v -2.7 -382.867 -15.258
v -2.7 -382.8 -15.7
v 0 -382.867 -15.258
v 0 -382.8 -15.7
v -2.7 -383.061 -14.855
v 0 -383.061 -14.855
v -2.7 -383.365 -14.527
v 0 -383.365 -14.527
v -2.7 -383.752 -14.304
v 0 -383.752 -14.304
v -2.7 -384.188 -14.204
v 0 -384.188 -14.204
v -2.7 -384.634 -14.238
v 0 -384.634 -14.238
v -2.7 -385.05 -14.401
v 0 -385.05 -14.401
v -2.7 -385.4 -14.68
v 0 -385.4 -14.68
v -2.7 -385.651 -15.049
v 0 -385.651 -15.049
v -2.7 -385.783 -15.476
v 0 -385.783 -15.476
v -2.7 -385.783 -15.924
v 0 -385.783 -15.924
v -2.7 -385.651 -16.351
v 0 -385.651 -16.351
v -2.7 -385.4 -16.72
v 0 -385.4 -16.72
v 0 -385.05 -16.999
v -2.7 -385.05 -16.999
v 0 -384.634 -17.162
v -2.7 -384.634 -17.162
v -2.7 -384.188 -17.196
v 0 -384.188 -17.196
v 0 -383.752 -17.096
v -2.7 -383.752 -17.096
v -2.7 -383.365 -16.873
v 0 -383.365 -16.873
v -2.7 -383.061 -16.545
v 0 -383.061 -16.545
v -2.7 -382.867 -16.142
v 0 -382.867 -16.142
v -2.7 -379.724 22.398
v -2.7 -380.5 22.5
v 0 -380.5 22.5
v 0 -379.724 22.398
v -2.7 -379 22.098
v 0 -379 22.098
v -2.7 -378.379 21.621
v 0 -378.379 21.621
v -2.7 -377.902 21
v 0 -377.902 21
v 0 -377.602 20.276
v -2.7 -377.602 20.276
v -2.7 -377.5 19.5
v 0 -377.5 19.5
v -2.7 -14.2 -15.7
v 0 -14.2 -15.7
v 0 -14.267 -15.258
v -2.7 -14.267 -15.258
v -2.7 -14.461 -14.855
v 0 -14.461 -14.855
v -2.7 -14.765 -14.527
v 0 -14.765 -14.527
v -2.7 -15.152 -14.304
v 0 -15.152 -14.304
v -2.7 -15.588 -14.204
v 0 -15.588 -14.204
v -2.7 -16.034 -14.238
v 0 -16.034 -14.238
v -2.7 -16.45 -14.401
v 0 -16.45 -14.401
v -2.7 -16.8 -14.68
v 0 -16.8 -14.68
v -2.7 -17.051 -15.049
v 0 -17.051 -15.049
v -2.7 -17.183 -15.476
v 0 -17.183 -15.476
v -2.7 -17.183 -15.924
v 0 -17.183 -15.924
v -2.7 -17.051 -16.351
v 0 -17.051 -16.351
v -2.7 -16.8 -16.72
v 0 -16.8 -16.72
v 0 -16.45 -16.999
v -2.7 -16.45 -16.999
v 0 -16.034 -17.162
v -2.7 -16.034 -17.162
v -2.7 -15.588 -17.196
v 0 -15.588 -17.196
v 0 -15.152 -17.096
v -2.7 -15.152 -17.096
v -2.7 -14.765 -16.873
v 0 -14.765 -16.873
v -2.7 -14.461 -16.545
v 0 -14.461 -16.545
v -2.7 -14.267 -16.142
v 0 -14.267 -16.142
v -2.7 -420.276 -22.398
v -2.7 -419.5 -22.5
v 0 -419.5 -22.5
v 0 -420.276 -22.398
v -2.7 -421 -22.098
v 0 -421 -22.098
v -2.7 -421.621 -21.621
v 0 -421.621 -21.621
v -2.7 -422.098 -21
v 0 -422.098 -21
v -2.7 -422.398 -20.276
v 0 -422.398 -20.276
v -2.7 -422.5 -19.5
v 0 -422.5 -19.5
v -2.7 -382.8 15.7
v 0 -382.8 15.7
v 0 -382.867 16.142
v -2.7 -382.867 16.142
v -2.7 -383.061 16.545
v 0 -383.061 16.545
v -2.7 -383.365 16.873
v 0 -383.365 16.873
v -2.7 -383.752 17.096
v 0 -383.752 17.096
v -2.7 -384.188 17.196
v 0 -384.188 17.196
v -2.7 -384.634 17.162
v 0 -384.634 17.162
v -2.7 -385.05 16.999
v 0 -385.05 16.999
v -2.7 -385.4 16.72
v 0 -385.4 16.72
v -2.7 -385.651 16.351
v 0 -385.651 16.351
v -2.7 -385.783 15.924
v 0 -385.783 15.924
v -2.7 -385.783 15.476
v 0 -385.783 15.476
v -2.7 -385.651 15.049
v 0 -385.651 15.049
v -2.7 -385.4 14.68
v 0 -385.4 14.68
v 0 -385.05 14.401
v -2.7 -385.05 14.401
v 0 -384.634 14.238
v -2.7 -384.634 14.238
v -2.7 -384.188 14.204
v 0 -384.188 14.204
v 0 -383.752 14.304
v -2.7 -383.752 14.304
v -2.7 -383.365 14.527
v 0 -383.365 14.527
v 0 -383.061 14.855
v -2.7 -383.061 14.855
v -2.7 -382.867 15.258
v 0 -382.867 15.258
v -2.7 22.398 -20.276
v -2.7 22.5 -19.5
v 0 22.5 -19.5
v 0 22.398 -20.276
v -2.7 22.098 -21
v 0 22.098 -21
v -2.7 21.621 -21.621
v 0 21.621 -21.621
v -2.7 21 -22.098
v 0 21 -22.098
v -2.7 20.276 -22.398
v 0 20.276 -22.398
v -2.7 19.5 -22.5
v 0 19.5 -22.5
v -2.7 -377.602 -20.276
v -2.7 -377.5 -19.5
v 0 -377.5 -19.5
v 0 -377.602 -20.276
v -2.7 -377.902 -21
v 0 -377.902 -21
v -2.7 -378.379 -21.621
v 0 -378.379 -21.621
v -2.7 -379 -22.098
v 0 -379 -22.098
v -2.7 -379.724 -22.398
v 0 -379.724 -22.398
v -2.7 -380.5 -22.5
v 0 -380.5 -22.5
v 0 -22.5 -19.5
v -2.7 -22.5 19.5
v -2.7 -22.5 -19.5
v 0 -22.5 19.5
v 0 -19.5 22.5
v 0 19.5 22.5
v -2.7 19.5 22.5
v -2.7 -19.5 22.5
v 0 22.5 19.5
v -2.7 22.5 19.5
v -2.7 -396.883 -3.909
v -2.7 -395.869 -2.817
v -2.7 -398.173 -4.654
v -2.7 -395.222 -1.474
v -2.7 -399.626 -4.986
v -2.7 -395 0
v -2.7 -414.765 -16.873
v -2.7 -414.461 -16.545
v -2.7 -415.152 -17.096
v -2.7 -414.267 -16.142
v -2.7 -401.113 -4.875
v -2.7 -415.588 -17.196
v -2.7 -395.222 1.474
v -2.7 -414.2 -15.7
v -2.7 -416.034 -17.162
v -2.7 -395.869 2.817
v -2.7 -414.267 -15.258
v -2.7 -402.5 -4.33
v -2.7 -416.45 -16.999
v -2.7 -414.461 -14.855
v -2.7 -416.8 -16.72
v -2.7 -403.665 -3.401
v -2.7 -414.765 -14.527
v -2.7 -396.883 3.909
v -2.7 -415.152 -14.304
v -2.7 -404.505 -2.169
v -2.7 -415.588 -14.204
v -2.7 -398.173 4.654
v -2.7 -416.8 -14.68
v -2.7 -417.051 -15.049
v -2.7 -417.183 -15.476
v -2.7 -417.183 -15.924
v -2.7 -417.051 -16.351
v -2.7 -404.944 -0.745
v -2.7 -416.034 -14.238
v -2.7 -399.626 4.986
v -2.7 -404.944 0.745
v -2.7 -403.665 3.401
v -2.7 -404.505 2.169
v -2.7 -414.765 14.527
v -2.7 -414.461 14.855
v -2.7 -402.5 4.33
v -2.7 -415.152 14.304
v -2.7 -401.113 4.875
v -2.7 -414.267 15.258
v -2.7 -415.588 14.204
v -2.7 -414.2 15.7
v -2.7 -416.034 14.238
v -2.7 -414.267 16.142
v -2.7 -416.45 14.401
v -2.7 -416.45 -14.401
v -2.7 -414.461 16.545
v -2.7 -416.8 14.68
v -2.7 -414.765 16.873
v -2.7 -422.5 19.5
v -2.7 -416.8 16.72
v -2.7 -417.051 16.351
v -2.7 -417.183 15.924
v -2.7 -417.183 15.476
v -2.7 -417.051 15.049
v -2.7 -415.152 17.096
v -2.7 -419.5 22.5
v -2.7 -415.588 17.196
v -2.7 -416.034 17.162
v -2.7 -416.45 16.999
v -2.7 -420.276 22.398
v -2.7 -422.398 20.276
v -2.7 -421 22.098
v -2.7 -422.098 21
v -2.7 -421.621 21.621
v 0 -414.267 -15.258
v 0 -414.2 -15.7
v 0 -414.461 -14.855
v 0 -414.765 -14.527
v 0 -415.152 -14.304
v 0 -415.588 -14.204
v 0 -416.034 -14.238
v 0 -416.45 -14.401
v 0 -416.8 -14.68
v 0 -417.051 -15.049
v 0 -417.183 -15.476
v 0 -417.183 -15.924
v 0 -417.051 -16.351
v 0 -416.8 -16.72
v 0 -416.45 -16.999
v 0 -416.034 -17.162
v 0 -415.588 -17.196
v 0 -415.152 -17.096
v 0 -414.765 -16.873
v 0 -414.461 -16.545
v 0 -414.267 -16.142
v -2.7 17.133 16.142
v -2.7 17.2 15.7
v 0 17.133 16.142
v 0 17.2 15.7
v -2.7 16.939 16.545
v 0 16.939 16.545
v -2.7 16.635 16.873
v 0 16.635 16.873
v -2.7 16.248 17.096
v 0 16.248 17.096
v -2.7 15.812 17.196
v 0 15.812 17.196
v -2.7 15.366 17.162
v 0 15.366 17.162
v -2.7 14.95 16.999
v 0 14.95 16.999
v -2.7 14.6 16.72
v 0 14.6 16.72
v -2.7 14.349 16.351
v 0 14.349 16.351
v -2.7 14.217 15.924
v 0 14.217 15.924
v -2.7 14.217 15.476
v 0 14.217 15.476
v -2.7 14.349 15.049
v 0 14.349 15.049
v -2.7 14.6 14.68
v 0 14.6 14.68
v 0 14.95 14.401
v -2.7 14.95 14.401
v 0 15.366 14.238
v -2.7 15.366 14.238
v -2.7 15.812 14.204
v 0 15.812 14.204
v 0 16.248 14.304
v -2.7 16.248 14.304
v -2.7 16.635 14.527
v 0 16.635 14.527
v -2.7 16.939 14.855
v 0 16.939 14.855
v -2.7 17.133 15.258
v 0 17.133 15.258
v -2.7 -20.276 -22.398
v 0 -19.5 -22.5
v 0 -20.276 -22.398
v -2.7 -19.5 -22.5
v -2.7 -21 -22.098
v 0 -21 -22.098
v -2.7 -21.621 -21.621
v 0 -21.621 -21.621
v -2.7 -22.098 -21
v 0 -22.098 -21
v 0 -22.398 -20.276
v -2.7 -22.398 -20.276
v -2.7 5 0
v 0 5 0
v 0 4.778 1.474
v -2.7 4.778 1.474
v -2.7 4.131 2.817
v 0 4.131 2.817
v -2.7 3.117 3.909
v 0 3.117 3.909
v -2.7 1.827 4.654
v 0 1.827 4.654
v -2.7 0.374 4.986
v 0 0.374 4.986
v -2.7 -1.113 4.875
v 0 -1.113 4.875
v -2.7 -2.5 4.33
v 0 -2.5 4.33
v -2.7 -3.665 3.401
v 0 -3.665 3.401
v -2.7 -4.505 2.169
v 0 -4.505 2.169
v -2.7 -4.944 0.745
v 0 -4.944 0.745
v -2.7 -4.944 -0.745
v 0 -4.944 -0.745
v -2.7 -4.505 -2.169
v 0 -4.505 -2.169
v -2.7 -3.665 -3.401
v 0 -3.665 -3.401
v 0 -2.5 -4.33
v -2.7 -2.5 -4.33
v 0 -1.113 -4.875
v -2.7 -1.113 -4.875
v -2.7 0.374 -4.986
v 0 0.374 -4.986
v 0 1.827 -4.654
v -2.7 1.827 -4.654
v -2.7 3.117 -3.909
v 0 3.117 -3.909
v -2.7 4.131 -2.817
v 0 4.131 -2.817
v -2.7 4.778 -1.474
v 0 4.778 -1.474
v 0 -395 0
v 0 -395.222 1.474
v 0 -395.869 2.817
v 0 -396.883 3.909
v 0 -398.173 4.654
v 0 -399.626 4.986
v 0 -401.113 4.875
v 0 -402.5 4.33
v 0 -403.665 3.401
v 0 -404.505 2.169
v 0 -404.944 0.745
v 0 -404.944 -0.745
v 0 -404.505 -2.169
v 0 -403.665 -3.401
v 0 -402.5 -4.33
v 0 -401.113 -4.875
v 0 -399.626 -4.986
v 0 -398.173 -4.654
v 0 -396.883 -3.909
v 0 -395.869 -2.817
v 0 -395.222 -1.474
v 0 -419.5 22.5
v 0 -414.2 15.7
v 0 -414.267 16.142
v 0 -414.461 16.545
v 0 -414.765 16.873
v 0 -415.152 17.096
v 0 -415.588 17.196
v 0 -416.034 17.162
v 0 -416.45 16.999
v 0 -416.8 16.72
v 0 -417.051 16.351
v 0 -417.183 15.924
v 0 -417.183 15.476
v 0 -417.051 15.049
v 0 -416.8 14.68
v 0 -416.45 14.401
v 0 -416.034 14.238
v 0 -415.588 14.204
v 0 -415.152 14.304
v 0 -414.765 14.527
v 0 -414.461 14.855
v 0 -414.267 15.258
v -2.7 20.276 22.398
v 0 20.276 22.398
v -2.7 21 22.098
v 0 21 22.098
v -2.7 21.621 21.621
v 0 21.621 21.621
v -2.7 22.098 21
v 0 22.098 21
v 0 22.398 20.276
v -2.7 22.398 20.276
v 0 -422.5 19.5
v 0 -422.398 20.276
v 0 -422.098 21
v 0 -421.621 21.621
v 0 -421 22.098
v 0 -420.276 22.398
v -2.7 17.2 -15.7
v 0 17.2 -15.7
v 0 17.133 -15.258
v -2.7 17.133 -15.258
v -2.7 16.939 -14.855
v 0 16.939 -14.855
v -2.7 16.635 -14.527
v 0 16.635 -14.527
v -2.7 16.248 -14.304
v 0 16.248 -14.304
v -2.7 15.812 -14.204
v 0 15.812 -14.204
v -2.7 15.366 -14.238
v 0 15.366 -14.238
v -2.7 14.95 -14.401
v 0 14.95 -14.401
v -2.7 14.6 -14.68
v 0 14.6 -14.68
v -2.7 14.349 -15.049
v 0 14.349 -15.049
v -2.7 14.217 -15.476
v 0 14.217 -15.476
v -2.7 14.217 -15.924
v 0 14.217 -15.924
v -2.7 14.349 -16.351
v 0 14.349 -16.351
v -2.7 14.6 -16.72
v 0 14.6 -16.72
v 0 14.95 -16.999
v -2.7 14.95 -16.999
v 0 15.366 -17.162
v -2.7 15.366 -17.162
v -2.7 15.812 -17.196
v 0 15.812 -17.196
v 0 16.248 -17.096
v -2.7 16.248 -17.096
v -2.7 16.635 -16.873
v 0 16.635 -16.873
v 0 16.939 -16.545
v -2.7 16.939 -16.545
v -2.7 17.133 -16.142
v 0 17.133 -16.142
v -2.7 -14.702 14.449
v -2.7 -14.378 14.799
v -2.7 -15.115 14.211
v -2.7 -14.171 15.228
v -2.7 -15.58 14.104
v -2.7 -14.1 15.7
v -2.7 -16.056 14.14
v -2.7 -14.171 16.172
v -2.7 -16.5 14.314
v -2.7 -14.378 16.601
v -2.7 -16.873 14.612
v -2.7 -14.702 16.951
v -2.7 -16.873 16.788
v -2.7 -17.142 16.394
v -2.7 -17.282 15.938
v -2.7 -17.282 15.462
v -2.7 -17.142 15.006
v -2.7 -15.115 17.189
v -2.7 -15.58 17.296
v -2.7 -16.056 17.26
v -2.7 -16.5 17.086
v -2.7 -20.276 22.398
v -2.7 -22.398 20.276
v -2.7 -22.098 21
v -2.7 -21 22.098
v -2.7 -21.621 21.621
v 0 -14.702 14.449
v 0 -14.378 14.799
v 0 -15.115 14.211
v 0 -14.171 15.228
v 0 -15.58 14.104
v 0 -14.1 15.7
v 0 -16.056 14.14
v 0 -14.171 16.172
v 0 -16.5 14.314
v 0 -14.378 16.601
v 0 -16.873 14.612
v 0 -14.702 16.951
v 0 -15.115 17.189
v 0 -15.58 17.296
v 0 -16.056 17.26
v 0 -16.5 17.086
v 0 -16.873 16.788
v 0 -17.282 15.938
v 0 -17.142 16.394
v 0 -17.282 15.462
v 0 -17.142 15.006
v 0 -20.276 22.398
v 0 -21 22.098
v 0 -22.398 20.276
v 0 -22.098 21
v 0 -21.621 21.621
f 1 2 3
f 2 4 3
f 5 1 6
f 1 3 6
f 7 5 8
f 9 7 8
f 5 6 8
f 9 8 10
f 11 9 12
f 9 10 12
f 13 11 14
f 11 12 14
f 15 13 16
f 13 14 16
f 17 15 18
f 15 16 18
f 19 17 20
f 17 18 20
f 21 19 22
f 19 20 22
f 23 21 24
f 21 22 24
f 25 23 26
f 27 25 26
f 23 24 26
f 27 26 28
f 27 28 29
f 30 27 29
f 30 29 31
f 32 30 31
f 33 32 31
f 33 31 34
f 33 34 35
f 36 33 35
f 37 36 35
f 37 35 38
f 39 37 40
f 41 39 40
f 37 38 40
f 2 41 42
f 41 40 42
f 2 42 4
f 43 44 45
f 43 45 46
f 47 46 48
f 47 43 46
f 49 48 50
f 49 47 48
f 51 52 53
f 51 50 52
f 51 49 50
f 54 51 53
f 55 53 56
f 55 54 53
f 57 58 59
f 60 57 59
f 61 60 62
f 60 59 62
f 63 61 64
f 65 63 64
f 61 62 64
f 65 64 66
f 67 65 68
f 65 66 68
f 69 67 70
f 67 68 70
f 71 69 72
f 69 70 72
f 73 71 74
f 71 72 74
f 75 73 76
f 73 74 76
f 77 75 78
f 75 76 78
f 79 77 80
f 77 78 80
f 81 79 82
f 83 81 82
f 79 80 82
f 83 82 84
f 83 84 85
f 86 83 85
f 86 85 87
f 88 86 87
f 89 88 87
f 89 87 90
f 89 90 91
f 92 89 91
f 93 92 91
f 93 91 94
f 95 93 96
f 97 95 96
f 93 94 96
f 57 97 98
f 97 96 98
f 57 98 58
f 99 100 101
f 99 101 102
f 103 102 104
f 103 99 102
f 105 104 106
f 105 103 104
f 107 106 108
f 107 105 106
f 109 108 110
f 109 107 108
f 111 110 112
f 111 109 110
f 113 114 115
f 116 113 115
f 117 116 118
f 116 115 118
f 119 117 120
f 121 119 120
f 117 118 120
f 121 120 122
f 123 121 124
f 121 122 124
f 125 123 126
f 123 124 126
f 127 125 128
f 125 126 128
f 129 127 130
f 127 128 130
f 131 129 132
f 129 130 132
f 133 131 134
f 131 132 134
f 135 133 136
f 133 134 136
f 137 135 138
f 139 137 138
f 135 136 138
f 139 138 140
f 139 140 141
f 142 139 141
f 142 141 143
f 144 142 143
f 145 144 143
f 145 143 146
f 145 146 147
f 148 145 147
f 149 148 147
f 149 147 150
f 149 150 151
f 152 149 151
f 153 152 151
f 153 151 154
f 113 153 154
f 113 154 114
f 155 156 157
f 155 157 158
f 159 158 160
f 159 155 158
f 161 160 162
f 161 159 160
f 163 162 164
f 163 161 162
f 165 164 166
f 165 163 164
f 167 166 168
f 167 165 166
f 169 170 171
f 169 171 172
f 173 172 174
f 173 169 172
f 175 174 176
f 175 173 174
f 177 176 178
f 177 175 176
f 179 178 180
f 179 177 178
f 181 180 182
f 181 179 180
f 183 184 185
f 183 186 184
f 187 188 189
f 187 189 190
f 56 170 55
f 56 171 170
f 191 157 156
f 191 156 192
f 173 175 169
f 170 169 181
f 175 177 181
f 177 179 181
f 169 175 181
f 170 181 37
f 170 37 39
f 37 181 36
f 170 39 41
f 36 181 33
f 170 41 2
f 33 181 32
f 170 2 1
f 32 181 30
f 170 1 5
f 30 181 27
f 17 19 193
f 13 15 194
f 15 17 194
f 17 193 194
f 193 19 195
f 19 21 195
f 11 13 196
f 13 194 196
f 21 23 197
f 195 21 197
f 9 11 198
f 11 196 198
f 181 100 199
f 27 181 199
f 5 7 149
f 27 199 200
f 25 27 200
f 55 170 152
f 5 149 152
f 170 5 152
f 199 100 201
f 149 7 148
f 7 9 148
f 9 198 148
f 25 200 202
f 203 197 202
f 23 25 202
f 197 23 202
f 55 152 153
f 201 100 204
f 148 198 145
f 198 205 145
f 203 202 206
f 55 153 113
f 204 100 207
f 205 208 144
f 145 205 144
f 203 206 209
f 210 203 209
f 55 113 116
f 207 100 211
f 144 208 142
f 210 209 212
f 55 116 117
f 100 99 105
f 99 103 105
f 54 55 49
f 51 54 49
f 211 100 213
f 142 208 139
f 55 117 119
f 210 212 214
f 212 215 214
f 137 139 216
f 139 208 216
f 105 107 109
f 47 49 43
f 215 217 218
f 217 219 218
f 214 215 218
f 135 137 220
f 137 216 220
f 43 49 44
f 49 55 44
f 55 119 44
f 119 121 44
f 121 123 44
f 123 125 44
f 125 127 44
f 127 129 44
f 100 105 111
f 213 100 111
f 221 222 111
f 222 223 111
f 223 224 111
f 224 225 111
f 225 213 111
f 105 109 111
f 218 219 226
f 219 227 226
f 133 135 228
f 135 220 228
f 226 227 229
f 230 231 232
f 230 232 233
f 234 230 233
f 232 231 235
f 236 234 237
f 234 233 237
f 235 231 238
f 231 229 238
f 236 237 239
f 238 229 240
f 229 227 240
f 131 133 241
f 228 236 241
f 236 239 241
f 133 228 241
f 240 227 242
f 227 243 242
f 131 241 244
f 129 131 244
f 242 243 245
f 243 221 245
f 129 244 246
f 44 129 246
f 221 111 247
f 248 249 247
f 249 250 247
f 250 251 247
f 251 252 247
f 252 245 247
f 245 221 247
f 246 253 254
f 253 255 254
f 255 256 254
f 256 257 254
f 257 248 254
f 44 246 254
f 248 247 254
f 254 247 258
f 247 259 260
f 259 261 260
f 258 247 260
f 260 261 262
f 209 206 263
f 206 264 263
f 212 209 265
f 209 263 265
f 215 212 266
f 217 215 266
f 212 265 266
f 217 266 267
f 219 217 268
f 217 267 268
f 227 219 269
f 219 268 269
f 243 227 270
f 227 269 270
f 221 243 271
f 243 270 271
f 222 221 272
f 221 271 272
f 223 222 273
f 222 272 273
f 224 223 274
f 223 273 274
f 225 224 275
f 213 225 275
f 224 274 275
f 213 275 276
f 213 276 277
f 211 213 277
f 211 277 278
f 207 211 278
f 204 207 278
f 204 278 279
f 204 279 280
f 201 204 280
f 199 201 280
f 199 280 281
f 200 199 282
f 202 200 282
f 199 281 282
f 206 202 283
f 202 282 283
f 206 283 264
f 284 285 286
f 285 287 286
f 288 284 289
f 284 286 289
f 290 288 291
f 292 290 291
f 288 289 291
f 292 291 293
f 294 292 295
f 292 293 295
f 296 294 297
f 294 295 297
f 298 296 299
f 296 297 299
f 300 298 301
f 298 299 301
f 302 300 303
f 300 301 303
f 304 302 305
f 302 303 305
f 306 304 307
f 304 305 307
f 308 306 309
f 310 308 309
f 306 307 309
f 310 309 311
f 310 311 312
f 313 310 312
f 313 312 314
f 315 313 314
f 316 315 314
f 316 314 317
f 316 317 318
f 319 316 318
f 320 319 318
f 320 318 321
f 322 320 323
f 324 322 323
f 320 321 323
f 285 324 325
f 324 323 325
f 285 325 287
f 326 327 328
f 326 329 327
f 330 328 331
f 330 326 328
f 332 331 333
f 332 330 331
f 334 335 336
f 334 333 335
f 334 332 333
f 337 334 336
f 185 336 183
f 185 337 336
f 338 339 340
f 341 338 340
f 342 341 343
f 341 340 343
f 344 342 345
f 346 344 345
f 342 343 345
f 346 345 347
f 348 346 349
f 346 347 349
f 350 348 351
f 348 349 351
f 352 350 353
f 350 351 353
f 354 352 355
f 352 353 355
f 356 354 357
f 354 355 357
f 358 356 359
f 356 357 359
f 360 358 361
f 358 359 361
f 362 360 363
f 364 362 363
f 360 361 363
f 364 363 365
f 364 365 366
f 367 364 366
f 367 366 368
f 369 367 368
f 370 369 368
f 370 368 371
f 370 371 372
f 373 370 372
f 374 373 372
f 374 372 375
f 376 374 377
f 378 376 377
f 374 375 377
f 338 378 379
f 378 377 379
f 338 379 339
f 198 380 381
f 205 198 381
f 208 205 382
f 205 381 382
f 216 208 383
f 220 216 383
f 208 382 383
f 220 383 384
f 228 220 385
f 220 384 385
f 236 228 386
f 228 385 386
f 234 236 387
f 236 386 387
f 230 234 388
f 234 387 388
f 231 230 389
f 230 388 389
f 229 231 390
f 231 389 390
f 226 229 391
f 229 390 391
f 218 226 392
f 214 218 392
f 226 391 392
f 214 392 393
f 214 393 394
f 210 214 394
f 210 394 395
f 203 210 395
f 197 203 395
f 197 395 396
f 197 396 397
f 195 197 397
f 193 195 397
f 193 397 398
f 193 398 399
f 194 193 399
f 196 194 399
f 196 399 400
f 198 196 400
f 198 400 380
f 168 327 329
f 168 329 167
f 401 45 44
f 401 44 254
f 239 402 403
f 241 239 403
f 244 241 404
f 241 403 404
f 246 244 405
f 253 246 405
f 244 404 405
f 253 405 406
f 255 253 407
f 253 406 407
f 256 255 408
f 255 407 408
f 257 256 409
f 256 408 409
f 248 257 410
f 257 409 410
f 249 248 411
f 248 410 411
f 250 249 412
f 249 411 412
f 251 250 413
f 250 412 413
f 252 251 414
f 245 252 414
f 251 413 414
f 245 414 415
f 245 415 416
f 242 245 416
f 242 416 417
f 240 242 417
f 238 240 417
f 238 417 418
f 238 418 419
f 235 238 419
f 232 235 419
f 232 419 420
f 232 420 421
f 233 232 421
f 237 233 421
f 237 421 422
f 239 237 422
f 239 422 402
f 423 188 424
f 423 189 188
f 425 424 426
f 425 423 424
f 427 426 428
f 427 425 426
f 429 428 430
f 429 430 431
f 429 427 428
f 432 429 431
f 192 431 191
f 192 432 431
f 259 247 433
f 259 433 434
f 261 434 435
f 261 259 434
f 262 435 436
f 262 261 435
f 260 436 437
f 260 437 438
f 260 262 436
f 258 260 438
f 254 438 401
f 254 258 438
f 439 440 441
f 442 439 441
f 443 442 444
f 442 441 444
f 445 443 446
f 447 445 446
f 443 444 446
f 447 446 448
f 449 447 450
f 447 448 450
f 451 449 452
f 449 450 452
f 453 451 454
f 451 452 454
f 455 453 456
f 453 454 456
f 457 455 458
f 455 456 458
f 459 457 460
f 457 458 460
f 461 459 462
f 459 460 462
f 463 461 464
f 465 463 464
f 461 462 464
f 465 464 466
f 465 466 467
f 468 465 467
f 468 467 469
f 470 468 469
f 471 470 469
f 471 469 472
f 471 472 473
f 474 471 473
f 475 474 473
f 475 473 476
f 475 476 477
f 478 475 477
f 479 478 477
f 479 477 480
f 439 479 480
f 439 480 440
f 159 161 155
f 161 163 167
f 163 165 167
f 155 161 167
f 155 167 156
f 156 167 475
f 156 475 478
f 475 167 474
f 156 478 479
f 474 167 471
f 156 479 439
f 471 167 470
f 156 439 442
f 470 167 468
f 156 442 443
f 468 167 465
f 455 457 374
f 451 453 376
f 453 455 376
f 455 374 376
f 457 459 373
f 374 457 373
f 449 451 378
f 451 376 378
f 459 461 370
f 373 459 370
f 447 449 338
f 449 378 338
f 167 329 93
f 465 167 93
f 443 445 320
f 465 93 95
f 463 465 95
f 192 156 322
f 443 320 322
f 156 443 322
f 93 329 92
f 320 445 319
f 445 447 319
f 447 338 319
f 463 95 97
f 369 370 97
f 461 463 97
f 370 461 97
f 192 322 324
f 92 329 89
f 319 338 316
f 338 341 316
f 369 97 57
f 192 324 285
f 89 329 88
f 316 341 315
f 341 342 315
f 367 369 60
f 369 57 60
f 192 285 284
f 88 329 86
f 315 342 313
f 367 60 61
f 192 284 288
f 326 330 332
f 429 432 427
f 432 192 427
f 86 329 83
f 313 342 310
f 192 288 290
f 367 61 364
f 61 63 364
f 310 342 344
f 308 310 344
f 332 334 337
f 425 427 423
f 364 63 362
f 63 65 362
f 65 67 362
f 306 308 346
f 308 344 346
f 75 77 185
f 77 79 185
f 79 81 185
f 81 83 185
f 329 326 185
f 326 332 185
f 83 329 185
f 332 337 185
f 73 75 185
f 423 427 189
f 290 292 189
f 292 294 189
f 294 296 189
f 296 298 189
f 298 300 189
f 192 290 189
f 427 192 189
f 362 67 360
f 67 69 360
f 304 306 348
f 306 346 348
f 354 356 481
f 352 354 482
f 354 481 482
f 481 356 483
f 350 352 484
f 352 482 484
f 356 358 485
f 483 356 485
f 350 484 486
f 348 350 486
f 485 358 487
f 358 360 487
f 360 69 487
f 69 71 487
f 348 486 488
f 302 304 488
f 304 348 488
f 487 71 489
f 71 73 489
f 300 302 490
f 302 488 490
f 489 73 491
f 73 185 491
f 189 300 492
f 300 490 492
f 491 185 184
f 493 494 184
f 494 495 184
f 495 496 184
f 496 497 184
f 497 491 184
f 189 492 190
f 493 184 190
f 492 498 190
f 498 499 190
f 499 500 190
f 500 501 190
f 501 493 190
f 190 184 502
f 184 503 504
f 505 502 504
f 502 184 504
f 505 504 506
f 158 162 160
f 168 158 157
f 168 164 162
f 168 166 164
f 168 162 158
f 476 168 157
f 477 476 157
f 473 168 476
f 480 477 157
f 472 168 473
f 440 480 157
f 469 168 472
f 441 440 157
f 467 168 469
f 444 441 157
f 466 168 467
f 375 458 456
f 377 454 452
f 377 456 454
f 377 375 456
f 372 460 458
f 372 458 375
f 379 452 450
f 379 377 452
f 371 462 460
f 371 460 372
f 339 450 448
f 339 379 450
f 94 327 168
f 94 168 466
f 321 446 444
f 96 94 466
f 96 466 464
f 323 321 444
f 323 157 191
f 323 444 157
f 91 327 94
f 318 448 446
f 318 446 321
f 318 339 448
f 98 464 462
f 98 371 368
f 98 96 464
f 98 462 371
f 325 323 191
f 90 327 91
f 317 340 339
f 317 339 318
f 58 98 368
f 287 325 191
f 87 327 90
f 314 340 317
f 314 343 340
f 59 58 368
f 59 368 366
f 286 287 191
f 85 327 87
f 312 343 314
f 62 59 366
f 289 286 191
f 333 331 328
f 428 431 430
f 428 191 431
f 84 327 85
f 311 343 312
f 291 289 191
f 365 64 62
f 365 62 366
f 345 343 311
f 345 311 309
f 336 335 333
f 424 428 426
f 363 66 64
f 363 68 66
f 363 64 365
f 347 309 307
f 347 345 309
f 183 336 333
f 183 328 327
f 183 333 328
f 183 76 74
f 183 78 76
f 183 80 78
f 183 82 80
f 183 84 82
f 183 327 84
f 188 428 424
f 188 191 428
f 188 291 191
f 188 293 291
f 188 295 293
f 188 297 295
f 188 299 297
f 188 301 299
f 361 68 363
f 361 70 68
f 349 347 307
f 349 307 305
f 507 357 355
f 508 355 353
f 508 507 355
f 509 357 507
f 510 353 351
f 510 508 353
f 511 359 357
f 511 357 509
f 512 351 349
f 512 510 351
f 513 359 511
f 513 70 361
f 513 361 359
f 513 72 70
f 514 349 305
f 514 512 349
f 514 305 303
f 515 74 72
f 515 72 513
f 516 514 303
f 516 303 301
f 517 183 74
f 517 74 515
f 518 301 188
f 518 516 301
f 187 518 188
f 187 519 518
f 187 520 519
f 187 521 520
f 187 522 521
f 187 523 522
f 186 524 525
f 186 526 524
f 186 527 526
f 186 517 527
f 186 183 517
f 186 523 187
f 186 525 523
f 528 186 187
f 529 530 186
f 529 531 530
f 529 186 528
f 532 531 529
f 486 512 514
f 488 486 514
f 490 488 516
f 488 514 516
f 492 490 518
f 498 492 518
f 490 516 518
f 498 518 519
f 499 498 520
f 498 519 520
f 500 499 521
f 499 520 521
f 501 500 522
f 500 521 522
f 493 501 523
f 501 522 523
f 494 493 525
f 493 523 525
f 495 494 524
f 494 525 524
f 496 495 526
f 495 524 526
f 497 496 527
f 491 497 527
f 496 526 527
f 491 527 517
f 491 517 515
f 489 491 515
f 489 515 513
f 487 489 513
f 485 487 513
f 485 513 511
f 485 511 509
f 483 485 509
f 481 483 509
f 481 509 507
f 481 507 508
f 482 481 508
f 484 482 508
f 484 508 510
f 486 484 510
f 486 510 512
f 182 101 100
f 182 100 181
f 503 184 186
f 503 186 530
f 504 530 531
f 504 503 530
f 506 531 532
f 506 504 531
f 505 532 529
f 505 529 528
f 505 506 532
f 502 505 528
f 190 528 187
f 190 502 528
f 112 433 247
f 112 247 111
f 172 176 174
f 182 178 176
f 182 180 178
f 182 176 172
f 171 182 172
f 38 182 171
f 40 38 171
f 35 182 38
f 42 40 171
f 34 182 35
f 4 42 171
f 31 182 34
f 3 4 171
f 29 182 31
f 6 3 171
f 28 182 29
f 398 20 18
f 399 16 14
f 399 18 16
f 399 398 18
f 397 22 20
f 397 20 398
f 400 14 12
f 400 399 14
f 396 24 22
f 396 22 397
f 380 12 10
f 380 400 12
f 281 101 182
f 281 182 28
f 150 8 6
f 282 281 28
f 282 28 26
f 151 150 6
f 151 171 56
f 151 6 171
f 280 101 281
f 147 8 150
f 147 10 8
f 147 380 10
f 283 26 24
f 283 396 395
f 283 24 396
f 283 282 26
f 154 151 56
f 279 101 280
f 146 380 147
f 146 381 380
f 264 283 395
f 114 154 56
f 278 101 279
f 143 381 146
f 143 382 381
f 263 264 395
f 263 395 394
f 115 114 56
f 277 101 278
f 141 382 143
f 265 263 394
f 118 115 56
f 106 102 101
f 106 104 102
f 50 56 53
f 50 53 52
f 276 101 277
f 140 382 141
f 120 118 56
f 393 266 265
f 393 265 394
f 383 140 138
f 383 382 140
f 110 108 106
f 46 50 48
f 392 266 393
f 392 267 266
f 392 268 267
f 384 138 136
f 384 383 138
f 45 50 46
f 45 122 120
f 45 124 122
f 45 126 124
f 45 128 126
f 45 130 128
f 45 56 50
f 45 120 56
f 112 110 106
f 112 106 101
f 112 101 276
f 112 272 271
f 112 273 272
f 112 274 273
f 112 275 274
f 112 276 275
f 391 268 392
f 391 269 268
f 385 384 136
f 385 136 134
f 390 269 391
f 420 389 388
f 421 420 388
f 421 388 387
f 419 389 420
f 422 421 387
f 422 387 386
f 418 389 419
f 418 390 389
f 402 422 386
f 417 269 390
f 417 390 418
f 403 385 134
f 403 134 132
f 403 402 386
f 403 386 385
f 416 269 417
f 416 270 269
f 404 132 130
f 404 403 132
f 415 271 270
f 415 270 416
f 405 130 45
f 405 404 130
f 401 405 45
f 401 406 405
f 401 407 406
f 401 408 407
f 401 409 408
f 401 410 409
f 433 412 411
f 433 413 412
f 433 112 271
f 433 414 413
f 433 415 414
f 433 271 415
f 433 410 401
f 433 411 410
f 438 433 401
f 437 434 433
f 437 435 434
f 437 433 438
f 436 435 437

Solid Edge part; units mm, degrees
sketch "Sketch1" plane through (0, 0, 0) normal (1, 0, 0) x (0, 1, 0)
  line L0 (-27.5, 15) -> (-372.5, 15)
  line L1 (-372.5, 15) -> (-372.5, 27.5)
  line L2 (-427.5, 27.5) -> (-372.5, 27.5)
  line L3 (-427.5, -27.5) -> (-427.5, 27.5)
  line L4 (-372.5, -27.5) -> (-427.5, -27.5)
  line L5 (-372.5, -15) -> (-372.5, -27.5)
  line L6 (-372.5, -15) -> (-27.5, -15)
  line L7 (-27.5, -15) -> (-27.5, -27.5)
  line L8 (-27.5, -27.5) -> (27.5, -27.5)
  line L9 (27.5, -27.5) -> (27.5, 27.5)
  line L10 (27.5, 27.5) -> (-27.5, 27.5)
  line L11 (-27.5, 15) -> (-27.5, 27.5)
  circle A0 centre (-415.7, 15.7) radius 1.5
  circle A1 centre (-384.3, 15.7) radius 1.5
  circle A2 centre (-400, 0) radius 5
  circle A3 centre (-384.3, -15.7) radius 1.5
  circle A4 centre (-415.7, -15.7) radius 1.5
  circle A5 centre (15.7, -15.7) radius 1.5
  circle A6 centre (0, 0) radius 5
  circle A7 centre (-15.7, -15.7) radius 1.5
  circle A8 centre (15.7, 15.7) radius 1.5
  circle A9 centre (-15.7, 15.7) radius 1.6
  dimension "D1" = 31.4
  dimension "D2" = 31.4
  dimension "D3" = 3
  dimension "D4" = 3
  dimension "D5" = 3
  dimension "D6" = 345
  dimension "D7" = 55
  dimension "D8" = 55
  dimension "D9" = 12.5
  dimension "D10" = 12.5
  dimension "D11" = 10
  dimension "D12" = 10
  dimension "D13" = 3.2
extrude "Protrusion1" add sketch "Sketch1" against normal blind 2.7
fillet "Round_External_Edges_Feature" radius 10 11 edges at (-1.35, -27.5, 27.5) (-1.35, -27.5, 15) (-1.35, 27.5, 27.5) (-1.35, 27.5, -27.5) (-1.35, -27.5, -27.5) (-1.35, -427.5, -27.5) (-1.35, -372.5, -27.5) (-1.35, -372.5, -15) (-1.35, -372.5, 15) (-1.35, -372.5, 27.5) (-1.35, -427.5, 27.5)
sketch "Sketch2" plane through (-2.7, -200, 0) normal (-1, 0, 0) x (0, -1, 0)
  circle A0 centre (-45.5, 6.95) radius 1.5
  circle A1 centre (-45.5, -6.95) radius 1.5
  circle A2 centre (45.5, -6.95) radius 1.5
  circle A3 centre (45.5, 6.95) radius 1.5
  dimension "D1" = 18.9
  dimension "D2" = 80
  dimension "D3" = 3
  dimension "D4" = 5.5
  dimension "D5" = 2.5
extrude "Cutout1" cut sketch "Sketch2" against normal up to next
sketch "Sketch3" plane through (-2.7, -200, 0) normal (-1, 0, 0) x (0, -1, 0)
  line L0 (172.5, -27.5) -> (172.5, 27.5)
  line L1 (172.5, 27.5) -> (-172.5, 27.5)
  line L2 (-172.5, 27.5) -> (-172.5, -27.5)
  line L3 (-172.5, -27.5) -> (172.5, -27.5)
extrude "Cutout2" cut sketch "Sketch3" against normal up to next
sketch "Sketch4" plane through (0, 0, 0) normal (1, 0, 0) x (0, 1, 0)
  line L0 (-422.5, -22.5) -> (-377.5, -22.5)
  line L1 (-377.5, -22.5) -> (-377.5, 22.5)
  line L2 (-377.5, 22.5) -> (-422.5, 22.5)
  line L3 (-422.5, 22.5) -> (-422.5, -22.5)
  line L4 (-430, -30) -> (-370, -30)
  line L5 (-370, -30) -> (-370, 30)
  line L6 (-370, 30) -> (-430, 30)
  line L7 (-430, 30) -> (-430, -30)
  dimension "D1" = 45
  dimension "D2" = 45
  dimension "D3" = 80
  dimension "D4" = 80
  dimension "D5" = 60
  dimension "D6" = 60
  dimension "D7" = 45
  dimension "D8" = 45
extrude "Cutout3" cut sketch "Sketch4" against normal up to next
fillet "Round_3" radius 3 4 edges at (-1.35, -422.5, -22.5) (-1.35, -422.5, 22.5) (-1.35, -377.5, 22.5) (-1.35, -377.5, -22.5)
sketch "Sketch5" plane through (0, 0, 0) normal (1, 0, 0) x (0, 1, 0)
  line L0 (22.5, 22.5) -> (-22.5, 22.5)
  line L1 (-22.5, 22.5) -> (-22.5, -22.5)
  line L2 (-22.5, -22.5) -> (22.5, -22.5)
  line L3 (22.5, -22.5) -> (22.5, 22.5)
  line L4 (40, -40) -> (40, 40)
  line L5 (40, 40) -> (-40, 40)
  line L6 (-40, 40) -> (-40, -40)
  line L7 (-40, -40) -> (40, -40)
  dimension "D1" = 45
  dimension "D2" = 45
  dimension "D3" = 80
  dimension "D4" = 80
  dimension "D5" = 60
  dimension "D6" = 60
  dimension "D7" = 45
  dimension "D8" = 45
extrude "Cutout4" cut sketch "Sketch5" against normal up to next
fillet "Round_4" radius 3 4 edges at (-1.35, 22.5, 22.5) (-1.35, 22.5, -22.5) (-1.35, -22.5, -22.5) (-1.35, -22.5, 22.5)
properties material "MDF"
